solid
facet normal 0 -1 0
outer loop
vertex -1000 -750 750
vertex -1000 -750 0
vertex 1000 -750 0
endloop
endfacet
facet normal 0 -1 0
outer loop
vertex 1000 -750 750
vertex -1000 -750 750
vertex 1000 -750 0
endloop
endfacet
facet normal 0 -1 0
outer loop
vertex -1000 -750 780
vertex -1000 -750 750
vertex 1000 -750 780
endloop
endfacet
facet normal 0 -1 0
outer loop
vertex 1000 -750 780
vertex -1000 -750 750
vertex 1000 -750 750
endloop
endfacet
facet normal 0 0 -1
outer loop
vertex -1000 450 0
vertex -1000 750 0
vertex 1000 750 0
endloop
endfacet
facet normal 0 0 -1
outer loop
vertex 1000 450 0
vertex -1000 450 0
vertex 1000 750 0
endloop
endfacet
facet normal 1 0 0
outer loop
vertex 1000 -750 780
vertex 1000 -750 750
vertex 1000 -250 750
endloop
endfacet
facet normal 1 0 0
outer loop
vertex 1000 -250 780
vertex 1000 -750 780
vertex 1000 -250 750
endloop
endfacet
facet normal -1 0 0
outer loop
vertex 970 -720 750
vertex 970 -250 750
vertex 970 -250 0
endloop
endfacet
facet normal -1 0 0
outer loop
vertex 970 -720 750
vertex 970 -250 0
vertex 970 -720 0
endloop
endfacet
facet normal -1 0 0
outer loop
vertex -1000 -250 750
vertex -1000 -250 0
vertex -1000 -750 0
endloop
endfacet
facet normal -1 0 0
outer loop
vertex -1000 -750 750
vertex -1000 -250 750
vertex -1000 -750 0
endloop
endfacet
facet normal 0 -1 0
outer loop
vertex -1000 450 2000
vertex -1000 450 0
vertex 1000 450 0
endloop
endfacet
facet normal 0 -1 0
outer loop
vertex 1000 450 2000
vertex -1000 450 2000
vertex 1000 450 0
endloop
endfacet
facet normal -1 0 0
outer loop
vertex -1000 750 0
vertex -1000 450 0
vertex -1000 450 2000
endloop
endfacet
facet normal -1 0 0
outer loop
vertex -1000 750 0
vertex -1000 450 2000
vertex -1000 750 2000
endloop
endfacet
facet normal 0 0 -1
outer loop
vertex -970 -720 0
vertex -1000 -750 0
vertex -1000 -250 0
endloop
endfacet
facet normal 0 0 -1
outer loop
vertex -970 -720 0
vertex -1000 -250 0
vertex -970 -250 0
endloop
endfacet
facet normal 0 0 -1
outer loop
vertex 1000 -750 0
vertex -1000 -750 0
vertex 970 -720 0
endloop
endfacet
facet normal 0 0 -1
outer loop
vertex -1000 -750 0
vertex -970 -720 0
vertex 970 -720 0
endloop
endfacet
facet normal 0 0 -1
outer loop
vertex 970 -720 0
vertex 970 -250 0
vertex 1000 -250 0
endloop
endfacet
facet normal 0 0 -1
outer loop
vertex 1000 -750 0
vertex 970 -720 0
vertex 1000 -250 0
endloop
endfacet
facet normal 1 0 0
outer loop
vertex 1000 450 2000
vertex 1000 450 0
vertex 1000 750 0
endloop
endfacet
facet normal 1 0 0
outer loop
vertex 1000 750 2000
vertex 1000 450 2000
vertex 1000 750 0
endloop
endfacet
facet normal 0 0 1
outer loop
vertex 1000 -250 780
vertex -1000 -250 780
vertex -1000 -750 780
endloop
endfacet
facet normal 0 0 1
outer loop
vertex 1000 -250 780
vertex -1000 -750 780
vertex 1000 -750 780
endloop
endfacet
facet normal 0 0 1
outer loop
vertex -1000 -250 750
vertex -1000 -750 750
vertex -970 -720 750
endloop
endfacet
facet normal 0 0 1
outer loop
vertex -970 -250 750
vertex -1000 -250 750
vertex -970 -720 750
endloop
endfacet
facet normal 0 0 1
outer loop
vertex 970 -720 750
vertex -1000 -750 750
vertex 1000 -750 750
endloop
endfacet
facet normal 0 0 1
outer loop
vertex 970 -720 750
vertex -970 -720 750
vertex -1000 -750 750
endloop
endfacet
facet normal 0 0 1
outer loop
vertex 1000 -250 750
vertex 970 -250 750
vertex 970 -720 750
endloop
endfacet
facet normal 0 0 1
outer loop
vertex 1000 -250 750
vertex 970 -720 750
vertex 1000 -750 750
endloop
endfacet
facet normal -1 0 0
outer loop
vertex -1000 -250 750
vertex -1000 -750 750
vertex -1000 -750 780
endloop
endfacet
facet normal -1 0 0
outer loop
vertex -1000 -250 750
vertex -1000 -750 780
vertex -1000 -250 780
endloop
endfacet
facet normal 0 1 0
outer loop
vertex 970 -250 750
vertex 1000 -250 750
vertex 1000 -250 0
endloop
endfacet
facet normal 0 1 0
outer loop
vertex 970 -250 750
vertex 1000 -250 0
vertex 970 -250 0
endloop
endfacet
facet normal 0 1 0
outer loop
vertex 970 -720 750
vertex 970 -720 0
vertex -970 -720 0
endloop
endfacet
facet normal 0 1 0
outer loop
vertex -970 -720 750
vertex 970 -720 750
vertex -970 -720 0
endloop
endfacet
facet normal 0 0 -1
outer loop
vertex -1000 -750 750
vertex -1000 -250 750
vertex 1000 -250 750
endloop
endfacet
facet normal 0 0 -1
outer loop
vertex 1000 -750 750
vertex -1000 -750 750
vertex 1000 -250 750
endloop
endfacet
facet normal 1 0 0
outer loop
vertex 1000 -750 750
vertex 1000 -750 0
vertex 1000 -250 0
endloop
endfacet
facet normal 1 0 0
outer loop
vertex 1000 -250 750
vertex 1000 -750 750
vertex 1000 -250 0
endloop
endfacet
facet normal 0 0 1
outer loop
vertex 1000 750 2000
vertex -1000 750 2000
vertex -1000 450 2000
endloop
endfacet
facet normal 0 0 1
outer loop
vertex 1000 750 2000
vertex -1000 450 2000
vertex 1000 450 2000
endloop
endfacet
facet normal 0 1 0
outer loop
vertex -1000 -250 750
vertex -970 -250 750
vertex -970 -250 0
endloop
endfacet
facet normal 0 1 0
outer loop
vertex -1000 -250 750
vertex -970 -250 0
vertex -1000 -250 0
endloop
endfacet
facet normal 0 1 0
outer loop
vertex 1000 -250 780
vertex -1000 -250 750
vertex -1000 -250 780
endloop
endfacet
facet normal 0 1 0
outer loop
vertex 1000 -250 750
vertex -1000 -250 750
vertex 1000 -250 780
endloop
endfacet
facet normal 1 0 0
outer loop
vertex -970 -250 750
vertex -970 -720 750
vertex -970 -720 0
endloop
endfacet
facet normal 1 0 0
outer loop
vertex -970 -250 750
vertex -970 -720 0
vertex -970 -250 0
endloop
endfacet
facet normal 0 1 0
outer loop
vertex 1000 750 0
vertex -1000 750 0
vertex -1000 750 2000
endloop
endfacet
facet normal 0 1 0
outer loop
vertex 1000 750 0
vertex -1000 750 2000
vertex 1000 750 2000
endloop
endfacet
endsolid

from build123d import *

# Parameters (mm, degrees)
F1_W     = 2000
F1_H     = 300
F2_DEPTH = 2000
F4_DEPTH = 750
F5_W     = 2000
F5_H     = 500
F6_DEPTH = 30


with BuildPart() as f2:
    # F1 (on Top) → F2 (new body)
    with BuildSketch(Plane.XY):
        with Locations((0, 600)):
            Rectangle(F1_W, F1_H)
    extrude(amount=F2_DEPTH)


with BuildPart() as f4:
    # F3 (on Top) → F4 (new body)
    with BuildSketch(Plane.XY):
        Polygon((1000, -750), (1000, -250), (970, -250), (970, -720), (-970, -720), (-970, -250), (-1000, -250), (-1000, -750), align=None)
    extrude(amount=F4_DEPTH)


with BuildPart() as f6:
    # F5 (on face) → F6 (new body)
    with BuildSketch(Plane.XY.offset(750)):
        with Locations((0, -500)):
            Rectangle(F5_W, F5_H)
    extrude(amount=F6_DEPTH)


with BuildPart() as f7_1:
    # F7: instance of F2
    add(f2.part.mirror(Plane.YZ))


solid = Compound([f2.part, f4.part, f6.part])
